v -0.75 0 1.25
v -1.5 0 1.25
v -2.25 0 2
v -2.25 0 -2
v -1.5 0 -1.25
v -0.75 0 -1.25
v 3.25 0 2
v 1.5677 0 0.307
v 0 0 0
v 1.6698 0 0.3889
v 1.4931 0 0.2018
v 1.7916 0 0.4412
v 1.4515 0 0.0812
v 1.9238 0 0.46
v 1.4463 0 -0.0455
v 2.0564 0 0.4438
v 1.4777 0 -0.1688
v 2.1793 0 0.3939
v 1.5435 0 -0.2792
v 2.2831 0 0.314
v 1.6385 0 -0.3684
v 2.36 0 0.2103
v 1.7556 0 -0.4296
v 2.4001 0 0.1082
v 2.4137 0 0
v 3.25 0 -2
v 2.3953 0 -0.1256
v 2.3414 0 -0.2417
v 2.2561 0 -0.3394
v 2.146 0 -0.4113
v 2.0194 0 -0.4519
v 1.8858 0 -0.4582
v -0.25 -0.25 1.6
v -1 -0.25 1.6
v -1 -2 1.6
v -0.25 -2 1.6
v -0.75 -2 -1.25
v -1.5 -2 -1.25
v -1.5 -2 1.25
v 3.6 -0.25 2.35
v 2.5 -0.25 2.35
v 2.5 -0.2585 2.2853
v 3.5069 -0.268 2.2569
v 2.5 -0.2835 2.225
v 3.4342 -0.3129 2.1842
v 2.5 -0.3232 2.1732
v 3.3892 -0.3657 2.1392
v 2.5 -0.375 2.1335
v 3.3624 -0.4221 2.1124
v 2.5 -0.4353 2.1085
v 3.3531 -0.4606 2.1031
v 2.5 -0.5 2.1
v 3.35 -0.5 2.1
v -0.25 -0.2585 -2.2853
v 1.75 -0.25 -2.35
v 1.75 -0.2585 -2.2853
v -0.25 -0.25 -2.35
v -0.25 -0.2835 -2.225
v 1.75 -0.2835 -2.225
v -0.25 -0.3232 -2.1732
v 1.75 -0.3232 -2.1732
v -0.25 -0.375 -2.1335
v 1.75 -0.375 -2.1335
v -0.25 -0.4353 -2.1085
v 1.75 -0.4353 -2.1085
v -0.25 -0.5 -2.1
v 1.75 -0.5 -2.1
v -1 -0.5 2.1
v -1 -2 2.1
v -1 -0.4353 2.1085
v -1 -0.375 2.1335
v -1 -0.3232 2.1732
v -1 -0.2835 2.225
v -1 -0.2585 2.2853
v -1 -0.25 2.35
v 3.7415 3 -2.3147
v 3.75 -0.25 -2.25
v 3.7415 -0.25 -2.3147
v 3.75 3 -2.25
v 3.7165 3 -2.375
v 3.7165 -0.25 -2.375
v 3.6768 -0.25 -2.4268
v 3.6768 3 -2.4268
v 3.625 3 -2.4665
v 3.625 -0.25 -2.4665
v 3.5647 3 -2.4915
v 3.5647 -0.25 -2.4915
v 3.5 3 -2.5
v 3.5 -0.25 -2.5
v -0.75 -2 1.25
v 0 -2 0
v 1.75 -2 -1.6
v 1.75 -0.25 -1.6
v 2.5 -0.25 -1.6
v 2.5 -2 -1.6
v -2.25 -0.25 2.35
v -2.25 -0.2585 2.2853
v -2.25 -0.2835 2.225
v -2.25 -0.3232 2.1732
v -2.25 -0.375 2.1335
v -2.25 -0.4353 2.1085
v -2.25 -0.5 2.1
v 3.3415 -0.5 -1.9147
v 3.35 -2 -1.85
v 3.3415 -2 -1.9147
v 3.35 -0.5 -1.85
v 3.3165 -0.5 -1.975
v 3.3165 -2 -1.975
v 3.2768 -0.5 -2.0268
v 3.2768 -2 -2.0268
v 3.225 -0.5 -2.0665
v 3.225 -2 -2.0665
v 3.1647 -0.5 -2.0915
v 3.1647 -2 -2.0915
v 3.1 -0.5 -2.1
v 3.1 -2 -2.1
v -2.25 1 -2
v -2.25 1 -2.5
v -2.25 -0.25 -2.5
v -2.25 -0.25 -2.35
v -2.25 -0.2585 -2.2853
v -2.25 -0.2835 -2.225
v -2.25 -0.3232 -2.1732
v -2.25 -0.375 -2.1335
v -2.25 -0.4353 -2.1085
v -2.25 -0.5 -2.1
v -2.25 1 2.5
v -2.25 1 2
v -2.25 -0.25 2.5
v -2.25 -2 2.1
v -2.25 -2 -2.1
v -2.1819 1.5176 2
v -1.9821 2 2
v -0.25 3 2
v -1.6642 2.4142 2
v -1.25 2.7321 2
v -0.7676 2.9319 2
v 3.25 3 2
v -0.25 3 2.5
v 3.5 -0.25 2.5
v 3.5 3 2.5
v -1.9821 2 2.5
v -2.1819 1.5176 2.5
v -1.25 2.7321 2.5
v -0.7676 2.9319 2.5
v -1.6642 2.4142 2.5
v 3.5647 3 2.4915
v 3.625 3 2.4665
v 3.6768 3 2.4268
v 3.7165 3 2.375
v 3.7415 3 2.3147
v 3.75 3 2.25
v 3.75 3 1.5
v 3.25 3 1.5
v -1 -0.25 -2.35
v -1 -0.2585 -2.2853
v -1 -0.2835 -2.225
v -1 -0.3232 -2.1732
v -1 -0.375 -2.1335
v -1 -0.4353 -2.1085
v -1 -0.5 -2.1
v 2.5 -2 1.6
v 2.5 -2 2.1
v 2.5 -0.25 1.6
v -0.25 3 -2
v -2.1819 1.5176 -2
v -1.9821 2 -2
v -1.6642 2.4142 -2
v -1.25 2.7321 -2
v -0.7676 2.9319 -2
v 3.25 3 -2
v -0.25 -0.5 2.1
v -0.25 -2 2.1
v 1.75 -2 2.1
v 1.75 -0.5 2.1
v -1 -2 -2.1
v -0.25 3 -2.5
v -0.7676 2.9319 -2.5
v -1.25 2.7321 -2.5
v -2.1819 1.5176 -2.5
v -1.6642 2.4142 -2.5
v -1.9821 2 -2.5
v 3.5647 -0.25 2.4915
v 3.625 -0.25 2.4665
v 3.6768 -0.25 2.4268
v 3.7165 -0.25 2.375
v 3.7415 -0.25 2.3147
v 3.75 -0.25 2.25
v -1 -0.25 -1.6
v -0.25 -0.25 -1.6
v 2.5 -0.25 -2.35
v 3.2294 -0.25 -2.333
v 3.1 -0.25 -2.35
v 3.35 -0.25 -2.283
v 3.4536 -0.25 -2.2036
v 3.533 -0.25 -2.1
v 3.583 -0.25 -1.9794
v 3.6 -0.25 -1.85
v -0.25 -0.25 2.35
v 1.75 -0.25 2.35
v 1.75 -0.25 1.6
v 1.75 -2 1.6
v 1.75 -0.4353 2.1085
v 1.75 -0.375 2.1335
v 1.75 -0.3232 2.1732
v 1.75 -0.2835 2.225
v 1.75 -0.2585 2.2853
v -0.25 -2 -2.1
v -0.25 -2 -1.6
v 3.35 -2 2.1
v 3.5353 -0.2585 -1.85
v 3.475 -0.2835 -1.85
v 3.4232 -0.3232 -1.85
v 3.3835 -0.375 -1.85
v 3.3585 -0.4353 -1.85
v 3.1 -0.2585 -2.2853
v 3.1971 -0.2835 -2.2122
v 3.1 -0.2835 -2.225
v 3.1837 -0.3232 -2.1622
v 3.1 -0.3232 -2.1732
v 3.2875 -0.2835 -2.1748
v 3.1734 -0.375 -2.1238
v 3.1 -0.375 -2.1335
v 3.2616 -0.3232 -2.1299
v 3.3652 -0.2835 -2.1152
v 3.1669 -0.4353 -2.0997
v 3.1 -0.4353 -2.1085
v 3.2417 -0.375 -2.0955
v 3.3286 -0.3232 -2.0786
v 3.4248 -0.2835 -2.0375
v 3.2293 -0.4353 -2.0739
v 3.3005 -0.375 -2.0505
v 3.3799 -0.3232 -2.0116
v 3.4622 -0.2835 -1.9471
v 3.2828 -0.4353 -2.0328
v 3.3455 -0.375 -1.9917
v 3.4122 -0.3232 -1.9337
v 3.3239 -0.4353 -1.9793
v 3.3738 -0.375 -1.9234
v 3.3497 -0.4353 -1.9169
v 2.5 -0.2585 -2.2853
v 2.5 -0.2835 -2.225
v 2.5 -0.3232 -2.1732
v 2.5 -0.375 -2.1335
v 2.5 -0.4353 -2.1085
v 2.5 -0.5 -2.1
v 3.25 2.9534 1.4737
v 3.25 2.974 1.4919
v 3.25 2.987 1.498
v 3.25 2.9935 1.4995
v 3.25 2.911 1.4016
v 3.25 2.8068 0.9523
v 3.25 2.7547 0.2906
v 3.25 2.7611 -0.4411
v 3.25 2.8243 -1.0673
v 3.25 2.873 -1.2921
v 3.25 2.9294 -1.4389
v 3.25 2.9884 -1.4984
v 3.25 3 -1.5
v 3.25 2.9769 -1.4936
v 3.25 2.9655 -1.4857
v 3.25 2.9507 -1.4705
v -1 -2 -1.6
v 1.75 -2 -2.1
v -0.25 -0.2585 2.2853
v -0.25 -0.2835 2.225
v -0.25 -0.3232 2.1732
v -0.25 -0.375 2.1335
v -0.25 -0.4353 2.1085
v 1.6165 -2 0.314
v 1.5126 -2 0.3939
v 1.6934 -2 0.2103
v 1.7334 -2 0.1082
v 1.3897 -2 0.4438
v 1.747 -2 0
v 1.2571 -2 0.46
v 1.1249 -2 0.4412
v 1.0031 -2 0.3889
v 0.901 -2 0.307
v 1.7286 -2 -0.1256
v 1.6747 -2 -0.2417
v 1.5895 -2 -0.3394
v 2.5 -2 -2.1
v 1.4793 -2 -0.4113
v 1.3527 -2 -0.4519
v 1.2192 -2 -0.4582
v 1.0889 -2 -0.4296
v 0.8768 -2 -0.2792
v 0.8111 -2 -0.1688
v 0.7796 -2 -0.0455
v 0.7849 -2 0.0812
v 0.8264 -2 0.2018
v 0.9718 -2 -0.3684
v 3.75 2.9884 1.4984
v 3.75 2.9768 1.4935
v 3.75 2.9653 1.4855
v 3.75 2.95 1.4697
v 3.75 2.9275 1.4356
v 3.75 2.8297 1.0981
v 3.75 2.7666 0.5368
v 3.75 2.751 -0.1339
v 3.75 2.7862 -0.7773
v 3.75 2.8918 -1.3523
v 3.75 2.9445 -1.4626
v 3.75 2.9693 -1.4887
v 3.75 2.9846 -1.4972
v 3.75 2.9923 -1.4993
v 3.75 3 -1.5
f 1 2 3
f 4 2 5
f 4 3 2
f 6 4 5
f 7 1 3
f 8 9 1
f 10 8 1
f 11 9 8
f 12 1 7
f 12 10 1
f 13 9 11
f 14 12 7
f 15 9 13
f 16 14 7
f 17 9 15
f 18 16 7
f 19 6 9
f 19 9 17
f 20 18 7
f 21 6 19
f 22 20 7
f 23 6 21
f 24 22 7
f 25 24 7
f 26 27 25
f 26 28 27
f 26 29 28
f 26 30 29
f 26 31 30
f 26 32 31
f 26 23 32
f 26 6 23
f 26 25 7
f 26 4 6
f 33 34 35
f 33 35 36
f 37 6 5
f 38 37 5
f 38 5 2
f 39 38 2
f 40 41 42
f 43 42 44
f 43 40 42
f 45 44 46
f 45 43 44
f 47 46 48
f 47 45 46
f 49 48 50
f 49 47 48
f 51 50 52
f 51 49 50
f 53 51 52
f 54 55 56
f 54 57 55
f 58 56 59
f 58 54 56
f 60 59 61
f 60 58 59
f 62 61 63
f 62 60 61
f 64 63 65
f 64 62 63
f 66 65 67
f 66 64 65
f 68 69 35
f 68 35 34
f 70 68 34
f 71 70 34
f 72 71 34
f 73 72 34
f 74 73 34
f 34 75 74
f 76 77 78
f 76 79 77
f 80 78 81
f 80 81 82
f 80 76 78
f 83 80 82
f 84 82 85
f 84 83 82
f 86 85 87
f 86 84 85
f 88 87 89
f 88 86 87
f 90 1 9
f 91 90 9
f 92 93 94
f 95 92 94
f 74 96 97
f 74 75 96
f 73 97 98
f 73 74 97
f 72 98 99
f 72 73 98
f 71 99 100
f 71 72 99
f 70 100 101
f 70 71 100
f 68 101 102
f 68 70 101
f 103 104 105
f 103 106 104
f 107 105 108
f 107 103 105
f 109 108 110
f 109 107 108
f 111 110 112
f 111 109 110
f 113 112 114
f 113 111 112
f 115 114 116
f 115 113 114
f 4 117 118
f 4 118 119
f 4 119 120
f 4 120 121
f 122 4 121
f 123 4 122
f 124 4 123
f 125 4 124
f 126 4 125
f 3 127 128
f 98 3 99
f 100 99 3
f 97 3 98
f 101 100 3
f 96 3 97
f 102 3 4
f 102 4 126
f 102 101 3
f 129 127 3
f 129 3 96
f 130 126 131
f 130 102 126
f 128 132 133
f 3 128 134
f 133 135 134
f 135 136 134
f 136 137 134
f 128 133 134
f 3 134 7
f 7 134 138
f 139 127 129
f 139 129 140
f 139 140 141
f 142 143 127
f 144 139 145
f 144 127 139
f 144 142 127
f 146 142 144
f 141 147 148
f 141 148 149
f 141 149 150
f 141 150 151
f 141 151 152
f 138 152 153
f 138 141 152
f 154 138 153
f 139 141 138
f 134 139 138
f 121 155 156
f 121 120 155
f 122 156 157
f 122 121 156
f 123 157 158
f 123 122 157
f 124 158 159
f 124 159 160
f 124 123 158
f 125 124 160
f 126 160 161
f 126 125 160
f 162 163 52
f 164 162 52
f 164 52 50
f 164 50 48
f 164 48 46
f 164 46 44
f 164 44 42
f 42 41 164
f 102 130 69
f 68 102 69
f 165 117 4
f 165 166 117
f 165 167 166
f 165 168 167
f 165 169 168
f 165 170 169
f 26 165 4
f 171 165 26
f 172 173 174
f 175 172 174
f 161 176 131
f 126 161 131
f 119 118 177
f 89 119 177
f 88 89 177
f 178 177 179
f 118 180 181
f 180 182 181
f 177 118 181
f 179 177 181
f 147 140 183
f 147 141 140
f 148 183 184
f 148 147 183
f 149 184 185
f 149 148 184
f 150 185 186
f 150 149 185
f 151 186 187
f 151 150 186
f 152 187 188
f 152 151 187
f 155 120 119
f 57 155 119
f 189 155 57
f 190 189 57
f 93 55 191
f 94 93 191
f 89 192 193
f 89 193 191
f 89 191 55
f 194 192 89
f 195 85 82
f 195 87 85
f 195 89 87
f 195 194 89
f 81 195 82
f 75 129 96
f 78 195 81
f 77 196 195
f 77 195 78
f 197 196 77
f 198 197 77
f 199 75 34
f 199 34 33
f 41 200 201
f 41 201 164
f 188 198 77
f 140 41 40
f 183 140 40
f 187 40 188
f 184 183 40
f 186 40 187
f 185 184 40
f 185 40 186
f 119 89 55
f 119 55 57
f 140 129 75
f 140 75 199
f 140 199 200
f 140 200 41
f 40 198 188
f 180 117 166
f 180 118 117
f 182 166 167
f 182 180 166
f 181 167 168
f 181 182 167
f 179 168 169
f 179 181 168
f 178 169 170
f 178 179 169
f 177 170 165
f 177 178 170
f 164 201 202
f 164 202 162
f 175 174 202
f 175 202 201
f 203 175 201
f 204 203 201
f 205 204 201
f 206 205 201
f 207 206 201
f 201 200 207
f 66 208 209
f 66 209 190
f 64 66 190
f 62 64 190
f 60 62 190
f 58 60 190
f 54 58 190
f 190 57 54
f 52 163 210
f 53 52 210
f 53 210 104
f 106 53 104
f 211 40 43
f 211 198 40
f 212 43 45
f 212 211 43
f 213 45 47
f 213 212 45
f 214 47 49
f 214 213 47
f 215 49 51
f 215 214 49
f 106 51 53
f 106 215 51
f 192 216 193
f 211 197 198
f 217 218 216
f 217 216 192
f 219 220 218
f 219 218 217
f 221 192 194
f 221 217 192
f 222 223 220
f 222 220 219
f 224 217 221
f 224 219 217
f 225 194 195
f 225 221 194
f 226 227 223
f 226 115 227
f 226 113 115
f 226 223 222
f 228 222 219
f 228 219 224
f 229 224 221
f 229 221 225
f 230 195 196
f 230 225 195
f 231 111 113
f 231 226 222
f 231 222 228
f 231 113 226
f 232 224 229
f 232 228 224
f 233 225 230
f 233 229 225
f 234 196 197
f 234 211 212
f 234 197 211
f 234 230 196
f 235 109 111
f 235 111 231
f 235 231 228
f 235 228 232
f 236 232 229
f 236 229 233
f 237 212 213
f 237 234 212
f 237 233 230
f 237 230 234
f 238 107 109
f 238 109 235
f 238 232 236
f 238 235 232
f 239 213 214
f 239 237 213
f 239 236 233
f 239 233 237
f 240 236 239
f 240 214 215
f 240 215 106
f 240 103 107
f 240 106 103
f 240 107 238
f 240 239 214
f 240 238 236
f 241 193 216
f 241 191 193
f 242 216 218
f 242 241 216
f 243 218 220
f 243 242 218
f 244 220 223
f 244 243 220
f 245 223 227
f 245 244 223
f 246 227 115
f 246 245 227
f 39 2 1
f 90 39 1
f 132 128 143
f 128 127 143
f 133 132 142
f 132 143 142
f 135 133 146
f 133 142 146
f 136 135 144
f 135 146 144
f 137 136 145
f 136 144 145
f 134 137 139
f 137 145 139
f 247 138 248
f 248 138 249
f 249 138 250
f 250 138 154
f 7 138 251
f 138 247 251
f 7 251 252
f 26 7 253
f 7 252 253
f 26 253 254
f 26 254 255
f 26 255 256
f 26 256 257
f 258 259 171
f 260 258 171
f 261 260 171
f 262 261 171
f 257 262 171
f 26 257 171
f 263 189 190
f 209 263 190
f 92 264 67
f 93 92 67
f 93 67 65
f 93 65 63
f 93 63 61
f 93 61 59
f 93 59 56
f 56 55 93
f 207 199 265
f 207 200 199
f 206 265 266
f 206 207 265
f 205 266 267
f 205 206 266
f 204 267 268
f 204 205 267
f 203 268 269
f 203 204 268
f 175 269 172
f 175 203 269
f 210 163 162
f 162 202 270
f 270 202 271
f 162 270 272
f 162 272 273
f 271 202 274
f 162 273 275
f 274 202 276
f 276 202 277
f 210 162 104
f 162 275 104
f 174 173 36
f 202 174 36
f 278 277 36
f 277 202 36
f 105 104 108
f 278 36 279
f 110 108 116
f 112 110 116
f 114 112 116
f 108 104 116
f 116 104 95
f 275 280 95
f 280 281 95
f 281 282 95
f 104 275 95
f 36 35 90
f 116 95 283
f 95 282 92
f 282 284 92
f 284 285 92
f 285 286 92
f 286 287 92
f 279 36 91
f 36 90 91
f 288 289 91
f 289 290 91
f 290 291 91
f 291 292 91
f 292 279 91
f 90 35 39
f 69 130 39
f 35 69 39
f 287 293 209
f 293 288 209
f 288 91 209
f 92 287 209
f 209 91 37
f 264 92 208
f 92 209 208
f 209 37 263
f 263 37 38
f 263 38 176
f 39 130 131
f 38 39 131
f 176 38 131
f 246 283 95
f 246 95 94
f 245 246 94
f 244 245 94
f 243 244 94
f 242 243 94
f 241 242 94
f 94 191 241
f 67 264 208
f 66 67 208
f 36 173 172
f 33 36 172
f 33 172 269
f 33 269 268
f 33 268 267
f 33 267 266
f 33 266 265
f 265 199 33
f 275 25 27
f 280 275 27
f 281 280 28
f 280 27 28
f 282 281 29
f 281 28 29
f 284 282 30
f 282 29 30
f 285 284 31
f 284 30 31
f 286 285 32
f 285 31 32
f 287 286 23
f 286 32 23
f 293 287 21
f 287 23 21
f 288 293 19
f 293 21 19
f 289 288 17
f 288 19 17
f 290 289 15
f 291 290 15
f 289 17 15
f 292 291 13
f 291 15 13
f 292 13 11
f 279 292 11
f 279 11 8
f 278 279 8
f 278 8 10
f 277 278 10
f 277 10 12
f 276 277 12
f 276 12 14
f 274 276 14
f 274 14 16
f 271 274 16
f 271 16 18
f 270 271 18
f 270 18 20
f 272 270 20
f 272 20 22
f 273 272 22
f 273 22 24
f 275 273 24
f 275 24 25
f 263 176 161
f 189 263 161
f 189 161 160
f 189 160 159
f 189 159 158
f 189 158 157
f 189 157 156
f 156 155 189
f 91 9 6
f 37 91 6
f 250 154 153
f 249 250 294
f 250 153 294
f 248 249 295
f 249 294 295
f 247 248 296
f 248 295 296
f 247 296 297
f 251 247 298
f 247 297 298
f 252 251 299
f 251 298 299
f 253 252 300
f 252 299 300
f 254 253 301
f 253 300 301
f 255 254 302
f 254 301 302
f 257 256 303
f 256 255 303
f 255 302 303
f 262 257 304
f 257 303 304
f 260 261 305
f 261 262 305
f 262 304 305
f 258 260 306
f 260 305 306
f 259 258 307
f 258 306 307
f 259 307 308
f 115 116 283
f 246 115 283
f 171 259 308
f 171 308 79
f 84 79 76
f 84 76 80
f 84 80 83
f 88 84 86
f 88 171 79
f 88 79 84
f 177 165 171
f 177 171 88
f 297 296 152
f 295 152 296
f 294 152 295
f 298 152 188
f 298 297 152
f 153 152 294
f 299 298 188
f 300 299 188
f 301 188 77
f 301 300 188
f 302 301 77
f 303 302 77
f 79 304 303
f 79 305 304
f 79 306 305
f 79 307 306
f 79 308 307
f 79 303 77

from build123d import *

# Parameters (mm, degrees)
BOSS_EXTRUDE2_DEPTH = 2
SKETCH8_R           = 0.46
CUT_EXTRUDE1_DEPTH  = 6.857687257
CUT_EXTRUDE3_DEPTH  = 5.308421985
BOSS_EXTRUDE3_DEPTH = 0.5
SKETCH11_W          = 5
SKETCH11_H          = 5
BOSS_EXTRUDE4_DEPTH = 0.5
FILLET1_R           = 2
CUT_EXTRUDE5_DEPTH  = 1.75
SKETCH13_W          = 0.75
SKETCH13_H          = 1.75
CUT_EXTRUDE4_DEPTH  = 0.5
FILLET2_R           = 0.25
FILLET3_R           = 0.25
SKETCH15_RX         = 1.5
SKETCH15_RY         = 0.25
CUT_EXTRUDE6_DEPTH  = 8.158910532


with BuildPart() as part:
    # Sketch5 → Boss-Extrude2 (new body)
    with BuildSketch(Plane(origin=(0, 0, 0), x_dir=(1, 0, 0), z_dir=(0, 1, 0))):
        Polygon((-2.25, -2), (1.75, -2), (3.25, -2), (3.25, 2), (1.75, 2), (-2.25, 2), align=None)
    extrude(amount=-BOSS_EXTRUDE2_DEPTH)

    # Sketch8 → Cut-Extrude1 (cut, through all)
    with BuildSketch(Plane(origin=(0.85, 2.55, 0), x_dir=(0.948683298050514, -0.3162277660168378, 0), z_dir=(0.3162277660168378, 0.948683298050514, 0))):
        with Locations((1.829822128, 0)):
            Circle(SKETCH8_R)
    extrude(amount=-CUT_EXTRUDE1_DEPTH, mode=Mode.SUBTRACT)

    # Sketch12 → Cut-Extrude3 (cut, through all)
    with BuildSketch(Plane(origin=(0, 0, 0), x_dir=(1, 0, 0), z_dir=(0, 1, 0))):
        Polygon((-1.5, 1.25), (-1.5, -1.25), (-0.75, -1.25), (0, 0), (-0.75, 1.25), align=None)
    extrude(amount=-CUT_EXTRUDE3_DEPTH, mode=Mode.SUBTRACT)

    # Sketch10 → Boss-Extrude3 (add)
    with BuildSketch(Plane.XY.offset(2)):
        Polygon((3.25, -2), (3.25, 3), (-2.25, 3), (-2.25, 0), (-2.25, -2), align=None)
    boss_extrude3 = extrude(amount=BOSS_EXTRUDE3_DEPTH)

    # Mirror1: Boss-Extrude3 across plane
    add(boss_extrude3.mirror(Plane.XY))

    # Sketch11 → Boss-Extrude4 (add)
    with BuildSketch(Plane(origin=(3.25, 0, 0), x_dir=(0, 0, -1), z_dir=(1, 0, 0))):
        with Locations((0, 0.5)):
            Rectangle(SKETCH11_W, SKETCH11_H)
    extrude(amount=BOSS_EXTRUDE4_DEPTH)

    # Fillet1
    fillet1_edges = [part.edges().sort_by_distance(p)[0] for p in [
        (-2.25, 3, 2.25),
        (-2.25, 3, -2.25),
    ]]
    fillet(fillet1_edges, radius=FILLET1_R)

    # Sketch14 → Cut-Extrude5 (cut)
    with BuildSketch(Plane.XZ.offset(2)):
        Polygon((-2.25, 2.5), (-2.25, 2.1), (3.35, 2.1), (3.35, -2.1), (-2.25, -2.1), (-2.25, -2.5), (3.75, -2.5), (3.75, 2.5), align=None)
    extrude(amount=-CUT_EXTRUDE5_DEPTH, mode=Mode.SUBTRACT)

    # Sketch13 → Cut-Extrude4 (cut)
    with BuildSketch(Plane.XY.offset(2.1)):
        with Locations((-0.625, -1.125)):
            Rectangle(SKETCH13_W, SKETCH13_H)
        with Locations((2.125, -1.125)):
            Rectangle(SKETCH13_W, SKETCH13_H)
    cut_extrude4 = extrude(amount=-CUT_EXTRUDE4_DEPTH, mode=Mode.SUBTRACT)

    # Mirror2: Cut-Extrude4 across plane
    add(cut_extrude4.mirror(Plane.XY), mode=Mode.SUBTRACT)

    # Fillet2
    fillet2_edges = [part.edges().sort_by_distance(p)[0] for p in [
        (2.925, -0.25, -2.1),
        (3.35, -0.25, 0),
        (3.35, -1.125, -2.1),
        (-1.625, -0.25, 2.1),
        (0.75, -0.25, 2.1),
        (2.925, -0.25, 2.1),
        (0.75, -0.25, -2.1),
        (-1.625, -0.25, -2.1),
    ]]
    fillet(fillet2_edges, radius=FILLET2_R)

    # Fillet3
    fillet3_edges = [part.edges().sort_by_distance(p)[0] for p in [
        (3.75, 1.375, -2.5),
        (3.75, 1.375, 2.5),
    ]]
    fillet(fillet3_edges, radius=FILLET3_R)

    # Sketch15 → Cut-Extrude6 (cut, through all)
    with BuildSketch(Plane(origin=(3.75, 0, 0), x_dir=(0, 0, -1), z_dir=(1, 0, 0))):
        with Locations((0, 3)):
            Ellipse(SKETCH15_RX, SKETCH15_RY)
    extrude(amount=-CUT_EXTRUDE6_DEPTH, mode=Mode.SUBTRACT)


solid = part.part
